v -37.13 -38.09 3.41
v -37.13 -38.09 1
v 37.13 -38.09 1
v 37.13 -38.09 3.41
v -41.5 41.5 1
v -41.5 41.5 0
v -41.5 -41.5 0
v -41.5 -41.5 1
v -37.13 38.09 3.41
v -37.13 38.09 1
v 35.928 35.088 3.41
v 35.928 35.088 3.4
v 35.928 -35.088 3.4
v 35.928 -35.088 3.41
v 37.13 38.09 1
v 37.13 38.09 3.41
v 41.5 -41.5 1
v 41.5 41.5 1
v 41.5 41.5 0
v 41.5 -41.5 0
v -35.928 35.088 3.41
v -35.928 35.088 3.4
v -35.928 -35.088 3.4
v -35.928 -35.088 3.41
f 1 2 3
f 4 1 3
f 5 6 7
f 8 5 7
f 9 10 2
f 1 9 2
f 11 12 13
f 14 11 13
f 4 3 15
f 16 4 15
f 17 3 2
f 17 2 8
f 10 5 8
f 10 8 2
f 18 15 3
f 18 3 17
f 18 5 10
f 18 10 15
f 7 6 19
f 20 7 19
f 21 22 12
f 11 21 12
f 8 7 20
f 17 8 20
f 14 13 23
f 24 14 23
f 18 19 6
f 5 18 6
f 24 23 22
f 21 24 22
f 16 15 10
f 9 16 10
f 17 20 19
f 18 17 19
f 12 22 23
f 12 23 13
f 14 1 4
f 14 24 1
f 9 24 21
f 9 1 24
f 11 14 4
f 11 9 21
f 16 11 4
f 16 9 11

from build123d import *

# Parameters (mm, degrees)
SKETCH_1_W      = 83
SKETCH_1_H      = 83
EXTRUDE_2_DEPTH = 1
SKETCH_1_5_W    = 71.856
SKETCH_1_5_H    = 70.176
EXTRUDE_5_DEPTH = 3.4
SKETCH_1_6_W    = 74.26
SKETCH_1_6_H    = 76.18
SKETCH_1_6_W_2  = 71.856
SKETCH_1_6_H_2  = 70.176
EXTRUDE_6_DEPTH = 3.41


with BuildPart() as part:
    # Эскиз1 → Бобышка-Вытянуть2 (new body)
    with BuildSketch(Plane.XY):
        Rectangle(SKETCH_1_W, SKETCH_1_H)
    extrude(amount=EXTRUDE_2_DEPTH)

    # Эскиз1<5> → Бобышка-Вытянуть5 (add)
    with BuildSketch(Plane.XY):
        Rectangle(SKETCH_1_5_W, SKETCH_1_5_H)
    extrude(amount=EXTRUDE_5_DEPTH)

    # Эскиз1<6> → Бобышка-Вытянуть6 (add)
    with BuildSketch(Plane.XY):
        Rectangle(SKETCH_1_6_W, SKETCH_1_6_H)
        Rectangle(SKETCH_1_6_W_2, SKETCH_1_6_H_2, mode=Mode.SUBTRACT)
    extrude(amount=EXTRUDE_6_DEPTH)


solid = part.part
